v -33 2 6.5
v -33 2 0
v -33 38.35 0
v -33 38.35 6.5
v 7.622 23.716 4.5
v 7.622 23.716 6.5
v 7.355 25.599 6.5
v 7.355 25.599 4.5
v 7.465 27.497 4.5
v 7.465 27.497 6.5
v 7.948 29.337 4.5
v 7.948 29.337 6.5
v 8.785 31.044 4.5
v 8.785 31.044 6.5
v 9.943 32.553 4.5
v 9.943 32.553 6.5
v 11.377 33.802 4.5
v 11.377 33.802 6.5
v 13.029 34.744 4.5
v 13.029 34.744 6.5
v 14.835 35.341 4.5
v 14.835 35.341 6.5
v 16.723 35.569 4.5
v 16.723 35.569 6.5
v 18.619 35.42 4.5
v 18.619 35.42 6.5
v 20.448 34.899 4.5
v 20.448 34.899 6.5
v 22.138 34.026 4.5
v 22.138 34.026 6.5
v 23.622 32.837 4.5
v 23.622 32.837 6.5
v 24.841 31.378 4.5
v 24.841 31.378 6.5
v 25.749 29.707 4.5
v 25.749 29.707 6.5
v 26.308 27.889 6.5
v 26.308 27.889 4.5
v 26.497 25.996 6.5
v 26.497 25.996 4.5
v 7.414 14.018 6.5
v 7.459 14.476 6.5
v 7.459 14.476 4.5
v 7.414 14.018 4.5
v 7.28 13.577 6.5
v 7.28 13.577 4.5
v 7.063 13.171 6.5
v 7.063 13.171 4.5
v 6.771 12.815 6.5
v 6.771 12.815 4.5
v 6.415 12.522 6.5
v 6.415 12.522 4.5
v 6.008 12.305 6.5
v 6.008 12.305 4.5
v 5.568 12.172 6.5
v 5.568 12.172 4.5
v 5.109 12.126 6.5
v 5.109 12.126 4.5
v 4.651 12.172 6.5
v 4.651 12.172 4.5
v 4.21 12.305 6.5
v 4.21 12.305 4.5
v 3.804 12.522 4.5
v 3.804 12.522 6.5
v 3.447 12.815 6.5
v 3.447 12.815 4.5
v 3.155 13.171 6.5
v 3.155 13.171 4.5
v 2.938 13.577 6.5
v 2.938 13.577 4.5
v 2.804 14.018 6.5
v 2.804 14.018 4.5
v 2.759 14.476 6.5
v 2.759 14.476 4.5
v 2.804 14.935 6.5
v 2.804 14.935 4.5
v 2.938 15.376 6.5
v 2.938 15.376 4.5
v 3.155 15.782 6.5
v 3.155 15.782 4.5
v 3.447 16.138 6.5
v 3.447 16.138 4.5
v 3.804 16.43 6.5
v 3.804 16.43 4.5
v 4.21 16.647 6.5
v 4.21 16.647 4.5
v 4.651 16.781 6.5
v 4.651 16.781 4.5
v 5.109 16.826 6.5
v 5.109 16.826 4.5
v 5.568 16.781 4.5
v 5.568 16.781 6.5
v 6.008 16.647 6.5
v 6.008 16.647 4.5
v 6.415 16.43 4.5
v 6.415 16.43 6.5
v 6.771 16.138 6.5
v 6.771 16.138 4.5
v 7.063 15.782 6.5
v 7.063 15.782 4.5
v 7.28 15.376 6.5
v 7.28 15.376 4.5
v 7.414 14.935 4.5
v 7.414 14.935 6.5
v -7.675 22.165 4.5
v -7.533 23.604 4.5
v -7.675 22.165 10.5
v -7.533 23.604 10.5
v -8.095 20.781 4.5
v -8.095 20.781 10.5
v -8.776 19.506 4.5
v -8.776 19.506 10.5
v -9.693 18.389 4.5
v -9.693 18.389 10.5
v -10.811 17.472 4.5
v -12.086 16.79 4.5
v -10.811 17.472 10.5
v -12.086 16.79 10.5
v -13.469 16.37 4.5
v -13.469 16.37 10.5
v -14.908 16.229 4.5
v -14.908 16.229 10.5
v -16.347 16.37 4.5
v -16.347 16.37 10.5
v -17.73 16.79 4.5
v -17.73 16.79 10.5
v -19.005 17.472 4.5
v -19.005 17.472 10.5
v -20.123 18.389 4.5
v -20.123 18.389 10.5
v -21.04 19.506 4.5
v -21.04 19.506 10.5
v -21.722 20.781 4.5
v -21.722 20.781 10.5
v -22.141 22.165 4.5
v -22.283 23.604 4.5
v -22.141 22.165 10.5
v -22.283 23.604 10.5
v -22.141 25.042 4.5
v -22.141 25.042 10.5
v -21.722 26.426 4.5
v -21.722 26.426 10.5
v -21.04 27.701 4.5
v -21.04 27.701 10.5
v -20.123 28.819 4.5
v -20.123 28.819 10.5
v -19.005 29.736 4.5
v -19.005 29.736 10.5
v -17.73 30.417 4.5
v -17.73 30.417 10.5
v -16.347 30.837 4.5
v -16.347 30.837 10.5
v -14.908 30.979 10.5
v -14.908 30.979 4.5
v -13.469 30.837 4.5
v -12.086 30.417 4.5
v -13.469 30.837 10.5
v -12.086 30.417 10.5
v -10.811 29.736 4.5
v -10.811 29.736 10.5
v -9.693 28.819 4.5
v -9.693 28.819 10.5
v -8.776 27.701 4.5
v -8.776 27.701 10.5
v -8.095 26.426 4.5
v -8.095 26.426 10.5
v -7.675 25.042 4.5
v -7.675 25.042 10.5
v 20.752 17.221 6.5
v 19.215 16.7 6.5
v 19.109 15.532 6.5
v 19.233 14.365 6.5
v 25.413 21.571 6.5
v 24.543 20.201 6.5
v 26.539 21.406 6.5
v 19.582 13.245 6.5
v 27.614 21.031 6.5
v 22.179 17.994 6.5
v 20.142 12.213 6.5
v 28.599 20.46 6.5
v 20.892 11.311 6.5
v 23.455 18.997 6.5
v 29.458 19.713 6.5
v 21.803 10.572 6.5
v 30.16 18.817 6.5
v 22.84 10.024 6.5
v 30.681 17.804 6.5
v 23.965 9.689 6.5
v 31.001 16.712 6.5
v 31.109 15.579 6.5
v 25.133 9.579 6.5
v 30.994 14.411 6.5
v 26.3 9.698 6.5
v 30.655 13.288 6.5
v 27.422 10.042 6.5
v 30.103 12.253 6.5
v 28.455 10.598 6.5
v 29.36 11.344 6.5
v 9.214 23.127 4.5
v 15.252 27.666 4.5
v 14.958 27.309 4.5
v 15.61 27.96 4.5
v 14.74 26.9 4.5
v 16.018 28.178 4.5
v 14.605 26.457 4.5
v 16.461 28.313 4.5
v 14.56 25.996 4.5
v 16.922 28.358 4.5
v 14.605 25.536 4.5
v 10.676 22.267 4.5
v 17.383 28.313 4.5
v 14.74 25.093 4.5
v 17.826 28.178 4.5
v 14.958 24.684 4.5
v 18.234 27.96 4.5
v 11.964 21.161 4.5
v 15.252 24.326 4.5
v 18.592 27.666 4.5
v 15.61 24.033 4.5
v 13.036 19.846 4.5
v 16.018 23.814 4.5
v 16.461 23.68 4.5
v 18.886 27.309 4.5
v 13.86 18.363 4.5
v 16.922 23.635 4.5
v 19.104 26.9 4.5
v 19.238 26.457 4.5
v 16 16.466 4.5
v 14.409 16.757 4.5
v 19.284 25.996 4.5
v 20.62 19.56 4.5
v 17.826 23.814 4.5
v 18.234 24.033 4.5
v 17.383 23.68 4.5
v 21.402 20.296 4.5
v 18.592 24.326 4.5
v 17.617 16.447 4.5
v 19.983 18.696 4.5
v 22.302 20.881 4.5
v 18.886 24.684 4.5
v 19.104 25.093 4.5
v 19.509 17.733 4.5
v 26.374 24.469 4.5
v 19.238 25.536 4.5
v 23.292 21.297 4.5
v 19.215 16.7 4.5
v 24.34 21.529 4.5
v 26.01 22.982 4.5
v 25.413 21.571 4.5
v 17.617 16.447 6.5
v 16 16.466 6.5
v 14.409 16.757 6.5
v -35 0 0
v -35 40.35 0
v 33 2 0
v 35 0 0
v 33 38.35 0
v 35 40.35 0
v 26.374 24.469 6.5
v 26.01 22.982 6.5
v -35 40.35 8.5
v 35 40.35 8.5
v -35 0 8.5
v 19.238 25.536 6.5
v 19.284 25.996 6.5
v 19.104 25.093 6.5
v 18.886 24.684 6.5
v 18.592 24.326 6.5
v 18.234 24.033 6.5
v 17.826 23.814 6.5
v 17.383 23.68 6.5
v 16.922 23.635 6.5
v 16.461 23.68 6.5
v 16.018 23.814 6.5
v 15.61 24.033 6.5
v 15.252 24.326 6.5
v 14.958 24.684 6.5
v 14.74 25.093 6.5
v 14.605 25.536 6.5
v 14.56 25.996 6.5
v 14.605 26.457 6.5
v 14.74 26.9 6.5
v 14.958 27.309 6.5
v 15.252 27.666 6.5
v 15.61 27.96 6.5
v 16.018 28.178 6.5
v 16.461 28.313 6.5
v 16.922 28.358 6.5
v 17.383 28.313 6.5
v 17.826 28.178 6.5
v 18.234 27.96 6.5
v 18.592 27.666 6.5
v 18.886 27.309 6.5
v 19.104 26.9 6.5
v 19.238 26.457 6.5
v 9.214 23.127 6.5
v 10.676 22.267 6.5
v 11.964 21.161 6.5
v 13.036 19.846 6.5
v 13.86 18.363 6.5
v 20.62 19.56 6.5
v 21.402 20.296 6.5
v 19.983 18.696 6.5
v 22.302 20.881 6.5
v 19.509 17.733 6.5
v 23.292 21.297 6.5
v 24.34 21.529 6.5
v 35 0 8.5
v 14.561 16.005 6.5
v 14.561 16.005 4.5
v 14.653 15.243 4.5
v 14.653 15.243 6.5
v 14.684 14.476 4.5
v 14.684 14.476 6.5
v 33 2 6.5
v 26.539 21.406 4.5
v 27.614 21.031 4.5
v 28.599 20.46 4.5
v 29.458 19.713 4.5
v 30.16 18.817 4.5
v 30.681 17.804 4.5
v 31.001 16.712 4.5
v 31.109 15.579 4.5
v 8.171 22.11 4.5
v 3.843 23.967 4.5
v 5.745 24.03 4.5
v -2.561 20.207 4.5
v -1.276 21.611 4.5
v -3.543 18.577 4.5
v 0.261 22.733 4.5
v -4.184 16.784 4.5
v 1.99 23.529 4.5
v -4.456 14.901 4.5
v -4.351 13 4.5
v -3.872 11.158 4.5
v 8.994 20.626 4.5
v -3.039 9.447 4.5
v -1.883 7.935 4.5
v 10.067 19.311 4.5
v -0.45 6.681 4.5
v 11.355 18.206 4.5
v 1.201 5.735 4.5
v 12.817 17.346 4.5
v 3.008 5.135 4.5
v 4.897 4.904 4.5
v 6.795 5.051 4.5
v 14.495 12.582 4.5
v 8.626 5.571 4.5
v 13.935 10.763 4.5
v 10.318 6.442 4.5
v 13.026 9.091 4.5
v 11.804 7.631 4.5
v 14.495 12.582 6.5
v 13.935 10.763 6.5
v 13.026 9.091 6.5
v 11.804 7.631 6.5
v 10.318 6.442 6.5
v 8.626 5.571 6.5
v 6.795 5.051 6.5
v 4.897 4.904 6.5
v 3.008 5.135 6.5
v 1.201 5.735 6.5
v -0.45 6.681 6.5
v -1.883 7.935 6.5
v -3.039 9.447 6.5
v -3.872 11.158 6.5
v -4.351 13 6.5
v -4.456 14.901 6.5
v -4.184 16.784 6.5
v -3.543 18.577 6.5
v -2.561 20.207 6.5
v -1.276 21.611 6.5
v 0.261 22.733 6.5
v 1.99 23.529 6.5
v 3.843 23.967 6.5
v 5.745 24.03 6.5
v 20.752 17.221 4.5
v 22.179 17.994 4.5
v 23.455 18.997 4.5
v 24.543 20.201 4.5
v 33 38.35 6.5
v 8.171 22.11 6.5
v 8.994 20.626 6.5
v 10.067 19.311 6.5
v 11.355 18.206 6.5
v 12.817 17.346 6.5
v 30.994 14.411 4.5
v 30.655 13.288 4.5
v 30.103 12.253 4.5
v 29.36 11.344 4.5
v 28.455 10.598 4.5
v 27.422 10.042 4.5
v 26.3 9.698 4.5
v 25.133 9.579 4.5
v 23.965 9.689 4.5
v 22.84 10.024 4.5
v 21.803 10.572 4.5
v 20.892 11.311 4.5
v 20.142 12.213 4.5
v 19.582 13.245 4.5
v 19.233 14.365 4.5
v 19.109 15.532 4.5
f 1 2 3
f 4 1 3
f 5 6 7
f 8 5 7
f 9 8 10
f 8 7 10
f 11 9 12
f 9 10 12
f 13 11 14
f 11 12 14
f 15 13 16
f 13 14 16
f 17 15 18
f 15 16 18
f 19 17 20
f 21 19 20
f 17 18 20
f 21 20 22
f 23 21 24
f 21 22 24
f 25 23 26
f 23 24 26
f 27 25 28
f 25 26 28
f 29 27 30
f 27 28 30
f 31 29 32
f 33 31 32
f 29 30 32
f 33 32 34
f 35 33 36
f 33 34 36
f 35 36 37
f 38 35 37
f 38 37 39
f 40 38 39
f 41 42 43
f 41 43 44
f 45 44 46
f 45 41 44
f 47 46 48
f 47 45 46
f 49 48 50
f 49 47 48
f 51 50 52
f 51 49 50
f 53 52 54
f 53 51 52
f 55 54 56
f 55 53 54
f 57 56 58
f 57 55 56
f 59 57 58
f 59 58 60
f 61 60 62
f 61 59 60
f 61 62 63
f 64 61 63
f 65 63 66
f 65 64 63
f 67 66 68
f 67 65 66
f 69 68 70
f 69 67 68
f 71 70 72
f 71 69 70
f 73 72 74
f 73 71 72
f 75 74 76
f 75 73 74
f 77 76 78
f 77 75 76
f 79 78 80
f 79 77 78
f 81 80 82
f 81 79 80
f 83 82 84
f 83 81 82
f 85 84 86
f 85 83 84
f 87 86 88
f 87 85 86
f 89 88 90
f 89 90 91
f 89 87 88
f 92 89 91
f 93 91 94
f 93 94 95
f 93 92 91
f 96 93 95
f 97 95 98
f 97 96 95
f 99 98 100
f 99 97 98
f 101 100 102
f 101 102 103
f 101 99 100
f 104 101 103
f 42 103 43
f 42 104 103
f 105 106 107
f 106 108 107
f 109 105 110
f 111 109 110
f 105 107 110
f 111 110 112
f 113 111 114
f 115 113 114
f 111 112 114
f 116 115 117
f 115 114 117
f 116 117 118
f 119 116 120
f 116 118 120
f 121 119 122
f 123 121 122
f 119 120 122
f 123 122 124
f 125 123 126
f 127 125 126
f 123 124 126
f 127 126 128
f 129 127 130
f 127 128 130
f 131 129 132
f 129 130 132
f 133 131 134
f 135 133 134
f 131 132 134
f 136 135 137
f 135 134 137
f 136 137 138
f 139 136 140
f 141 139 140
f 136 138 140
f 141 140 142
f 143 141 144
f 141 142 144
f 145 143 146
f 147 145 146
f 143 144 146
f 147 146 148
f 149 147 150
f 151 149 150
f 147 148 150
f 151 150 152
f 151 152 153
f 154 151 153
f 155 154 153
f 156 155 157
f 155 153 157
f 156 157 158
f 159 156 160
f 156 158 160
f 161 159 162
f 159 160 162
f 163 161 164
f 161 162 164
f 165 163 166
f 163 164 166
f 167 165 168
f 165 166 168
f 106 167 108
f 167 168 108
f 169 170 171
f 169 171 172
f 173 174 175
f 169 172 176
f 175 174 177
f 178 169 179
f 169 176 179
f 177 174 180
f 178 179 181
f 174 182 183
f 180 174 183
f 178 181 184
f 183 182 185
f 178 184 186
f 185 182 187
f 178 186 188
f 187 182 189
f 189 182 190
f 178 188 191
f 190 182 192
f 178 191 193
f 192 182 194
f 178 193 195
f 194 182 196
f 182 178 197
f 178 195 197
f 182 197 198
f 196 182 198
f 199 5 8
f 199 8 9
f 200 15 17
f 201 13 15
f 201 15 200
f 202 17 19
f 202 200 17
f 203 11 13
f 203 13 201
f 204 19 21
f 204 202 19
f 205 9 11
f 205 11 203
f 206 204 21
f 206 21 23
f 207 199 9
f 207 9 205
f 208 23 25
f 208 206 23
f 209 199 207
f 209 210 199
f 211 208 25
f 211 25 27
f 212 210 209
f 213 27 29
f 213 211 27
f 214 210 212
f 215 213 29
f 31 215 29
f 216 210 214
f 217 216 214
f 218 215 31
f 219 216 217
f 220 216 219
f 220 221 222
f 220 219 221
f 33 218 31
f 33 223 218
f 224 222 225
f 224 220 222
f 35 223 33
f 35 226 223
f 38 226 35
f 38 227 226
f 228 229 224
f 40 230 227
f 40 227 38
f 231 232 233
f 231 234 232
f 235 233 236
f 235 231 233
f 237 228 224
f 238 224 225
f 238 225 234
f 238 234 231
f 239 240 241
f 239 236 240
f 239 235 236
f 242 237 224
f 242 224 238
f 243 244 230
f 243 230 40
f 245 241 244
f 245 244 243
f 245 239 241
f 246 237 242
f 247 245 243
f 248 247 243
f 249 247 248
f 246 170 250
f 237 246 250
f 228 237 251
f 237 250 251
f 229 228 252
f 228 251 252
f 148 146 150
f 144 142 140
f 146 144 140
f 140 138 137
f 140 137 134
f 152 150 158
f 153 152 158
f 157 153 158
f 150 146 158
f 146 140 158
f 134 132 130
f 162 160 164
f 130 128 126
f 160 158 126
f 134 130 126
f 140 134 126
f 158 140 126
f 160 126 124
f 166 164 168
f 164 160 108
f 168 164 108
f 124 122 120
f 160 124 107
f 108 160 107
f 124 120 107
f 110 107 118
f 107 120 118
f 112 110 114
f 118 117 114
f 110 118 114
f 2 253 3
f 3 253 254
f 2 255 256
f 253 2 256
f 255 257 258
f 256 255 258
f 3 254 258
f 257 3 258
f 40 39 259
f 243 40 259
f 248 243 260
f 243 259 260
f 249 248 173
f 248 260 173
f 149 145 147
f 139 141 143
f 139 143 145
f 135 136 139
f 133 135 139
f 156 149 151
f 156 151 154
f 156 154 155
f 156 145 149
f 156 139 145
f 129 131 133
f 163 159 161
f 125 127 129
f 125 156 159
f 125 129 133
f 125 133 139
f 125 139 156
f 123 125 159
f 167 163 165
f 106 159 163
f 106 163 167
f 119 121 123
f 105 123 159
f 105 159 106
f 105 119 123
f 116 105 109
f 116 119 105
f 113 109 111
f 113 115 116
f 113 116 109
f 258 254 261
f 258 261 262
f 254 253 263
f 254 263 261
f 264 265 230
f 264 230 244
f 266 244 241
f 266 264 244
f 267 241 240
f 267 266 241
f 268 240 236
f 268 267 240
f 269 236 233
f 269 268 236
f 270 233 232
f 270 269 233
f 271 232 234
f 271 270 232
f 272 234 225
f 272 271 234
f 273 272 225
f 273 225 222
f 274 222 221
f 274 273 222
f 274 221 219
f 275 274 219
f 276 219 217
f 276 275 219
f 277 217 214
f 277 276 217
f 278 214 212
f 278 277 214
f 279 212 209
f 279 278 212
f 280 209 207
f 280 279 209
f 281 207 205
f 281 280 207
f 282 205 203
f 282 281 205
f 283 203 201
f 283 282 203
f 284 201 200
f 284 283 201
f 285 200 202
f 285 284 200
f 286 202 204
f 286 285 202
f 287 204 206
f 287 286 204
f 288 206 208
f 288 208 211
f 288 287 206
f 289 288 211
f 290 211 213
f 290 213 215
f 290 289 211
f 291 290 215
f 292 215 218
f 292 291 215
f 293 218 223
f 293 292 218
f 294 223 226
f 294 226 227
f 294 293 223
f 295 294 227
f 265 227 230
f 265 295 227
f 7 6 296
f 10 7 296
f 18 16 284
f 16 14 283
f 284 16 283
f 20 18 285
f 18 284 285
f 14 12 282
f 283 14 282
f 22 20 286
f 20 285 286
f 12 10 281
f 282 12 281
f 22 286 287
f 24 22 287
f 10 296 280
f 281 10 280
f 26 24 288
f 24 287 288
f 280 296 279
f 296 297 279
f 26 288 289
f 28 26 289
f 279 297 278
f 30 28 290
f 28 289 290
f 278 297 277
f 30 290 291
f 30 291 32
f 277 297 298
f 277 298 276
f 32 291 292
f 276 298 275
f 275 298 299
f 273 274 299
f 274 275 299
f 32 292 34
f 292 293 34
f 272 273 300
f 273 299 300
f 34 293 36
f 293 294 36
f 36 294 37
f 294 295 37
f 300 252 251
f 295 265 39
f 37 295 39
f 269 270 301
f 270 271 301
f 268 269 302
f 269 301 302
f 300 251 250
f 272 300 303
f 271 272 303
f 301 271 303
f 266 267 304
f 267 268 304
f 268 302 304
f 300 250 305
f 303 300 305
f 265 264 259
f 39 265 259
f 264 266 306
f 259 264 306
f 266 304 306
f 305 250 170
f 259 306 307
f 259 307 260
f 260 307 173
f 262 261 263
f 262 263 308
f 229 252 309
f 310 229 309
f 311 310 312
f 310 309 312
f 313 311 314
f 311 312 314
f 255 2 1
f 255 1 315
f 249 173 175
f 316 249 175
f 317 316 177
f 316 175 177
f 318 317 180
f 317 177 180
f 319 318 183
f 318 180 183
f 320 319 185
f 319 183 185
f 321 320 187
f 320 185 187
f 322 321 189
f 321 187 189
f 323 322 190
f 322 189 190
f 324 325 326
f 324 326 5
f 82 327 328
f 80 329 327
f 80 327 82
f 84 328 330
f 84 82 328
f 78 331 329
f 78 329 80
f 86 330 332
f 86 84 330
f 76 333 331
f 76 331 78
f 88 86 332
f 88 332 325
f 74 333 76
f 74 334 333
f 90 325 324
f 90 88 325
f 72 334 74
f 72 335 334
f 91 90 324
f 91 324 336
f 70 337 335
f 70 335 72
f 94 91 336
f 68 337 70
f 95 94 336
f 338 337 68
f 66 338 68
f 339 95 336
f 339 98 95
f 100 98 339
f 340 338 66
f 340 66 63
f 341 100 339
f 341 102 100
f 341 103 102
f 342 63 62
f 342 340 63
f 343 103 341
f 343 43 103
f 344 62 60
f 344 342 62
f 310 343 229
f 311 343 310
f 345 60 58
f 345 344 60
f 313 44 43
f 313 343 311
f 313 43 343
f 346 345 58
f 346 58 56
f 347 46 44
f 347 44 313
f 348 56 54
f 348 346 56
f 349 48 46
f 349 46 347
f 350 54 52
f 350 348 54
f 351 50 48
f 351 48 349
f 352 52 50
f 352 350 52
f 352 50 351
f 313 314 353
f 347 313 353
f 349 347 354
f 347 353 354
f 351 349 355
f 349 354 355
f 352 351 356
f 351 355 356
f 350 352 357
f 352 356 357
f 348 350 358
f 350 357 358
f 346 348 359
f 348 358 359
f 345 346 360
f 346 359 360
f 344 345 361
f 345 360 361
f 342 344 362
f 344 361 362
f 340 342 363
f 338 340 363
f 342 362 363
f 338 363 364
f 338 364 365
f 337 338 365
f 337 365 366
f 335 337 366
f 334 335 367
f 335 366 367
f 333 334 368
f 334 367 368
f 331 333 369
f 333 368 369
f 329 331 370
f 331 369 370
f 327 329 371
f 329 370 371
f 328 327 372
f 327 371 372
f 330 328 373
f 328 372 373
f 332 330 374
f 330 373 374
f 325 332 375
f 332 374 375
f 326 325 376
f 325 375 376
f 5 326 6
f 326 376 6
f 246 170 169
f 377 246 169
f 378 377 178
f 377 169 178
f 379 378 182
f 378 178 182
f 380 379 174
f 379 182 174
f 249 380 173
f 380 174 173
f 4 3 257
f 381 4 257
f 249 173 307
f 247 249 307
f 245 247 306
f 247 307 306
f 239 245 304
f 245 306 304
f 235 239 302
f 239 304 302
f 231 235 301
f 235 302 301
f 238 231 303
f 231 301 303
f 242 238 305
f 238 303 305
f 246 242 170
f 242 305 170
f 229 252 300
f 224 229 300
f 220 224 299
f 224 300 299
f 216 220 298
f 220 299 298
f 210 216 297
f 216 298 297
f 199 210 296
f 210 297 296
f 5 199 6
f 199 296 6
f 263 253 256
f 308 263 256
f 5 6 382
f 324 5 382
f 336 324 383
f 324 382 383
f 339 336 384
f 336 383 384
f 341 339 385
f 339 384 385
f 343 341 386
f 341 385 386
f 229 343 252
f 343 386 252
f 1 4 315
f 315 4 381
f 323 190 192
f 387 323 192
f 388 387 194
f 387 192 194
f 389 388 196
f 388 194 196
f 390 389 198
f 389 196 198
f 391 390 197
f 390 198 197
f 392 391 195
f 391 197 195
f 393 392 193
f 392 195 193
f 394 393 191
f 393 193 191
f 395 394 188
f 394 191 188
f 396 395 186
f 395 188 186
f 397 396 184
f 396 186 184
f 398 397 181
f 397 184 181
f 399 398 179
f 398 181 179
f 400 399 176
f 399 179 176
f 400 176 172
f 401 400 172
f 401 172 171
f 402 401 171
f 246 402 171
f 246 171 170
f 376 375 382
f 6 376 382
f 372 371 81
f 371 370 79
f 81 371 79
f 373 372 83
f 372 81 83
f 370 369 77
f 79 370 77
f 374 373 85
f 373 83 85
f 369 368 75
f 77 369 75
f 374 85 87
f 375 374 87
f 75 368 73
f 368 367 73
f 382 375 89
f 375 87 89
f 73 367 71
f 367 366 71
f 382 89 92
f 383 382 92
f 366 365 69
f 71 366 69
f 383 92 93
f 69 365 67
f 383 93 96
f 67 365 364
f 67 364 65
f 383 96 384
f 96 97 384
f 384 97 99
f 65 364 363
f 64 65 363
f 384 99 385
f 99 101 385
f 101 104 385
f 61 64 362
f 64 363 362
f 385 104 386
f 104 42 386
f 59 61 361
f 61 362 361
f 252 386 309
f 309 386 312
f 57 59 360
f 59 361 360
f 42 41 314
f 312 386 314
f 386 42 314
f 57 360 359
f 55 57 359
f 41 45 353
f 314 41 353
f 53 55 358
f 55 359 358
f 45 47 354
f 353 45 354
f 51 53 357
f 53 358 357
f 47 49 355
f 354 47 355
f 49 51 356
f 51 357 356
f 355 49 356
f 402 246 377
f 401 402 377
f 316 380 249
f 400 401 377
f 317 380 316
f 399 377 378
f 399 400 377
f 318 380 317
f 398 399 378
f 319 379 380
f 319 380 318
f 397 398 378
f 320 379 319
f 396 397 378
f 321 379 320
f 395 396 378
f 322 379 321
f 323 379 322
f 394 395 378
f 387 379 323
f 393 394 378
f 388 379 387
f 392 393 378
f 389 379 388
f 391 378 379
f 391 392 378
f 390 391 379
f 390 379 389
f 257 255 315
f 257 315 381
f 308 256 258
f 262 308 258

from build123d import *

# Parameters (mm, degrees)
F0_W     = 70
F0_H     = 40.35
F1_DEPTH = 8.5
F2_T     = -2
F3_R     = 7.375
F4_DEPTH = 2
F3_R_2   = 2.3617937204
F3_R_3   = 2.35
F5_DEPTH = 6


with BuildPart() as f1:
    # F0 (on Top) → F1 (new body)
    with BuildSketch(Plane.XY):
        with Locations((0, 20.175)):
            Rectangle(F0_W, F0_H)
    extrude(amount=F1_DEPTH)

    # F2
    f2_openings = [f1.faces().sort_by_distance(p)[0] for p in [
        (0, 20.175, 0),
    ]]
    offset(amount=F2_T, openings=f2_openings)


with BuildPart() as f4:
    # F3 (on face) → F4 (new body)
    with BuildSketch(Plane(origin=(0, 0, 6.5), x_dir=(1, 0, 0), z_dir=(0, 0, -1))):
        with Locations((-14.9081461403, -23.6036587987)):
            Circle(F3_R)
    extrude(amount=F4_DEPTH)

    # F5 (add): a face of the model
    f5_faces = [f4.faces().sort_by_distance(p)[0] for p in [
        (-14.9081461403, 23.6036587987, 4.5),
    ]]
    extrude(f5_faces, amount=-F5_DEPTH)


with BuildPart() as f4b:
    # F3 (on face) → F4, piece 2 (new body)
    with BuildSketch(Plane(origin=(0, 0, 6.5), x_dir=(1, 0, 0), z_dir=(0, 0, -1))):
        with BuildLine():
            ThreePointArc((7.6223985069, -23.715632426), (15.7731046859, -35.5022585988), (26.4967896861, -25.9964105162))
            ThreePointArc((26.4967896861, -25.9964105162), (26.2218277724, -23.7182716719), (25.4127340008, -21.5709738546))
            ThreePointArc((25.4127340008, -21.5709738546), (21.4016687656, -20.2961312745), (19.2148790784, -16.7000474618))
            ThreePointArc((19.2148790784, -16.7000474618), (16.8080721143, -16.4220858238), (14.4085460796, -16.7571339441))
            ThreePointArc((14.4085460796, -16.7571339441), (11.9640626624, -21.1614784837), (7.6223985069, -23.715632426))
        make_face()
        with Locations((16.9217896861, -25.9964105162)):
            Circle(F3_R_2, mode=Mode.SUBTRACT)
    extrude(amount=F4_DEPTH)


with BuildPart() as f4c:
    # F3 (on face) → F4, piece 3 (new body)
    with BuildSketch(Plane(origin=(0, 0, 6.5), x_dir=(1, 0, 0), z_dir=(0, 0, -1))):
        with BuildLine():
            ThreePointArc((19.2148790784, -16.7000474618), (22.8383196429, -18.4681106901), (25.4127340008, -21.5709738546))
            ThreePointArc((25.4127340008, -21.5709738546), (29.4578026559, -19.7125749443), (31.1091549004, -15.5786587987))
            ThreePointArc((31.1091549004, -15.5786587987), (24.5459741711, -9.6051483177), (19.2148790784, -16.7000474618))
        make_face()
    extrude(amount=F4_DEPTH)


with BuildPart() as f4d:
    # F3 (on face) → F4, piece 4 (new body)
    with BuildSketch(Plane(origin=(0, 0, 6.5), x_dir=(1, 0, 0), z_dir=(0, 0, -1))):
        with BuildLine():
            ThreePointArc((14.6841549004, -14.4763558539), (-2.4982405978, -8.6618774823), (7.6223985069, -23.715632426))
            ThreePointArc((7.6223985069, -23.715632426), (10.0668819241, -19.3112878864), (14.4085460796, -16.7571339441))
            ThreePointArc((14.4085460796, -16.7571339441), (14.6150029831, -15.6250408542), (14.6841549004, -14.4763558539))
        make_face()
        with Locations((5.1091549004, -14.4763558539)):
            Circle(F3_R_3, mode=Mode.SUBTRACT)
    extrude(amount=F4_DEPTH)


solid = Compound([f1.part, f4.part, f4b.part, f4c.part, f4d.part])
